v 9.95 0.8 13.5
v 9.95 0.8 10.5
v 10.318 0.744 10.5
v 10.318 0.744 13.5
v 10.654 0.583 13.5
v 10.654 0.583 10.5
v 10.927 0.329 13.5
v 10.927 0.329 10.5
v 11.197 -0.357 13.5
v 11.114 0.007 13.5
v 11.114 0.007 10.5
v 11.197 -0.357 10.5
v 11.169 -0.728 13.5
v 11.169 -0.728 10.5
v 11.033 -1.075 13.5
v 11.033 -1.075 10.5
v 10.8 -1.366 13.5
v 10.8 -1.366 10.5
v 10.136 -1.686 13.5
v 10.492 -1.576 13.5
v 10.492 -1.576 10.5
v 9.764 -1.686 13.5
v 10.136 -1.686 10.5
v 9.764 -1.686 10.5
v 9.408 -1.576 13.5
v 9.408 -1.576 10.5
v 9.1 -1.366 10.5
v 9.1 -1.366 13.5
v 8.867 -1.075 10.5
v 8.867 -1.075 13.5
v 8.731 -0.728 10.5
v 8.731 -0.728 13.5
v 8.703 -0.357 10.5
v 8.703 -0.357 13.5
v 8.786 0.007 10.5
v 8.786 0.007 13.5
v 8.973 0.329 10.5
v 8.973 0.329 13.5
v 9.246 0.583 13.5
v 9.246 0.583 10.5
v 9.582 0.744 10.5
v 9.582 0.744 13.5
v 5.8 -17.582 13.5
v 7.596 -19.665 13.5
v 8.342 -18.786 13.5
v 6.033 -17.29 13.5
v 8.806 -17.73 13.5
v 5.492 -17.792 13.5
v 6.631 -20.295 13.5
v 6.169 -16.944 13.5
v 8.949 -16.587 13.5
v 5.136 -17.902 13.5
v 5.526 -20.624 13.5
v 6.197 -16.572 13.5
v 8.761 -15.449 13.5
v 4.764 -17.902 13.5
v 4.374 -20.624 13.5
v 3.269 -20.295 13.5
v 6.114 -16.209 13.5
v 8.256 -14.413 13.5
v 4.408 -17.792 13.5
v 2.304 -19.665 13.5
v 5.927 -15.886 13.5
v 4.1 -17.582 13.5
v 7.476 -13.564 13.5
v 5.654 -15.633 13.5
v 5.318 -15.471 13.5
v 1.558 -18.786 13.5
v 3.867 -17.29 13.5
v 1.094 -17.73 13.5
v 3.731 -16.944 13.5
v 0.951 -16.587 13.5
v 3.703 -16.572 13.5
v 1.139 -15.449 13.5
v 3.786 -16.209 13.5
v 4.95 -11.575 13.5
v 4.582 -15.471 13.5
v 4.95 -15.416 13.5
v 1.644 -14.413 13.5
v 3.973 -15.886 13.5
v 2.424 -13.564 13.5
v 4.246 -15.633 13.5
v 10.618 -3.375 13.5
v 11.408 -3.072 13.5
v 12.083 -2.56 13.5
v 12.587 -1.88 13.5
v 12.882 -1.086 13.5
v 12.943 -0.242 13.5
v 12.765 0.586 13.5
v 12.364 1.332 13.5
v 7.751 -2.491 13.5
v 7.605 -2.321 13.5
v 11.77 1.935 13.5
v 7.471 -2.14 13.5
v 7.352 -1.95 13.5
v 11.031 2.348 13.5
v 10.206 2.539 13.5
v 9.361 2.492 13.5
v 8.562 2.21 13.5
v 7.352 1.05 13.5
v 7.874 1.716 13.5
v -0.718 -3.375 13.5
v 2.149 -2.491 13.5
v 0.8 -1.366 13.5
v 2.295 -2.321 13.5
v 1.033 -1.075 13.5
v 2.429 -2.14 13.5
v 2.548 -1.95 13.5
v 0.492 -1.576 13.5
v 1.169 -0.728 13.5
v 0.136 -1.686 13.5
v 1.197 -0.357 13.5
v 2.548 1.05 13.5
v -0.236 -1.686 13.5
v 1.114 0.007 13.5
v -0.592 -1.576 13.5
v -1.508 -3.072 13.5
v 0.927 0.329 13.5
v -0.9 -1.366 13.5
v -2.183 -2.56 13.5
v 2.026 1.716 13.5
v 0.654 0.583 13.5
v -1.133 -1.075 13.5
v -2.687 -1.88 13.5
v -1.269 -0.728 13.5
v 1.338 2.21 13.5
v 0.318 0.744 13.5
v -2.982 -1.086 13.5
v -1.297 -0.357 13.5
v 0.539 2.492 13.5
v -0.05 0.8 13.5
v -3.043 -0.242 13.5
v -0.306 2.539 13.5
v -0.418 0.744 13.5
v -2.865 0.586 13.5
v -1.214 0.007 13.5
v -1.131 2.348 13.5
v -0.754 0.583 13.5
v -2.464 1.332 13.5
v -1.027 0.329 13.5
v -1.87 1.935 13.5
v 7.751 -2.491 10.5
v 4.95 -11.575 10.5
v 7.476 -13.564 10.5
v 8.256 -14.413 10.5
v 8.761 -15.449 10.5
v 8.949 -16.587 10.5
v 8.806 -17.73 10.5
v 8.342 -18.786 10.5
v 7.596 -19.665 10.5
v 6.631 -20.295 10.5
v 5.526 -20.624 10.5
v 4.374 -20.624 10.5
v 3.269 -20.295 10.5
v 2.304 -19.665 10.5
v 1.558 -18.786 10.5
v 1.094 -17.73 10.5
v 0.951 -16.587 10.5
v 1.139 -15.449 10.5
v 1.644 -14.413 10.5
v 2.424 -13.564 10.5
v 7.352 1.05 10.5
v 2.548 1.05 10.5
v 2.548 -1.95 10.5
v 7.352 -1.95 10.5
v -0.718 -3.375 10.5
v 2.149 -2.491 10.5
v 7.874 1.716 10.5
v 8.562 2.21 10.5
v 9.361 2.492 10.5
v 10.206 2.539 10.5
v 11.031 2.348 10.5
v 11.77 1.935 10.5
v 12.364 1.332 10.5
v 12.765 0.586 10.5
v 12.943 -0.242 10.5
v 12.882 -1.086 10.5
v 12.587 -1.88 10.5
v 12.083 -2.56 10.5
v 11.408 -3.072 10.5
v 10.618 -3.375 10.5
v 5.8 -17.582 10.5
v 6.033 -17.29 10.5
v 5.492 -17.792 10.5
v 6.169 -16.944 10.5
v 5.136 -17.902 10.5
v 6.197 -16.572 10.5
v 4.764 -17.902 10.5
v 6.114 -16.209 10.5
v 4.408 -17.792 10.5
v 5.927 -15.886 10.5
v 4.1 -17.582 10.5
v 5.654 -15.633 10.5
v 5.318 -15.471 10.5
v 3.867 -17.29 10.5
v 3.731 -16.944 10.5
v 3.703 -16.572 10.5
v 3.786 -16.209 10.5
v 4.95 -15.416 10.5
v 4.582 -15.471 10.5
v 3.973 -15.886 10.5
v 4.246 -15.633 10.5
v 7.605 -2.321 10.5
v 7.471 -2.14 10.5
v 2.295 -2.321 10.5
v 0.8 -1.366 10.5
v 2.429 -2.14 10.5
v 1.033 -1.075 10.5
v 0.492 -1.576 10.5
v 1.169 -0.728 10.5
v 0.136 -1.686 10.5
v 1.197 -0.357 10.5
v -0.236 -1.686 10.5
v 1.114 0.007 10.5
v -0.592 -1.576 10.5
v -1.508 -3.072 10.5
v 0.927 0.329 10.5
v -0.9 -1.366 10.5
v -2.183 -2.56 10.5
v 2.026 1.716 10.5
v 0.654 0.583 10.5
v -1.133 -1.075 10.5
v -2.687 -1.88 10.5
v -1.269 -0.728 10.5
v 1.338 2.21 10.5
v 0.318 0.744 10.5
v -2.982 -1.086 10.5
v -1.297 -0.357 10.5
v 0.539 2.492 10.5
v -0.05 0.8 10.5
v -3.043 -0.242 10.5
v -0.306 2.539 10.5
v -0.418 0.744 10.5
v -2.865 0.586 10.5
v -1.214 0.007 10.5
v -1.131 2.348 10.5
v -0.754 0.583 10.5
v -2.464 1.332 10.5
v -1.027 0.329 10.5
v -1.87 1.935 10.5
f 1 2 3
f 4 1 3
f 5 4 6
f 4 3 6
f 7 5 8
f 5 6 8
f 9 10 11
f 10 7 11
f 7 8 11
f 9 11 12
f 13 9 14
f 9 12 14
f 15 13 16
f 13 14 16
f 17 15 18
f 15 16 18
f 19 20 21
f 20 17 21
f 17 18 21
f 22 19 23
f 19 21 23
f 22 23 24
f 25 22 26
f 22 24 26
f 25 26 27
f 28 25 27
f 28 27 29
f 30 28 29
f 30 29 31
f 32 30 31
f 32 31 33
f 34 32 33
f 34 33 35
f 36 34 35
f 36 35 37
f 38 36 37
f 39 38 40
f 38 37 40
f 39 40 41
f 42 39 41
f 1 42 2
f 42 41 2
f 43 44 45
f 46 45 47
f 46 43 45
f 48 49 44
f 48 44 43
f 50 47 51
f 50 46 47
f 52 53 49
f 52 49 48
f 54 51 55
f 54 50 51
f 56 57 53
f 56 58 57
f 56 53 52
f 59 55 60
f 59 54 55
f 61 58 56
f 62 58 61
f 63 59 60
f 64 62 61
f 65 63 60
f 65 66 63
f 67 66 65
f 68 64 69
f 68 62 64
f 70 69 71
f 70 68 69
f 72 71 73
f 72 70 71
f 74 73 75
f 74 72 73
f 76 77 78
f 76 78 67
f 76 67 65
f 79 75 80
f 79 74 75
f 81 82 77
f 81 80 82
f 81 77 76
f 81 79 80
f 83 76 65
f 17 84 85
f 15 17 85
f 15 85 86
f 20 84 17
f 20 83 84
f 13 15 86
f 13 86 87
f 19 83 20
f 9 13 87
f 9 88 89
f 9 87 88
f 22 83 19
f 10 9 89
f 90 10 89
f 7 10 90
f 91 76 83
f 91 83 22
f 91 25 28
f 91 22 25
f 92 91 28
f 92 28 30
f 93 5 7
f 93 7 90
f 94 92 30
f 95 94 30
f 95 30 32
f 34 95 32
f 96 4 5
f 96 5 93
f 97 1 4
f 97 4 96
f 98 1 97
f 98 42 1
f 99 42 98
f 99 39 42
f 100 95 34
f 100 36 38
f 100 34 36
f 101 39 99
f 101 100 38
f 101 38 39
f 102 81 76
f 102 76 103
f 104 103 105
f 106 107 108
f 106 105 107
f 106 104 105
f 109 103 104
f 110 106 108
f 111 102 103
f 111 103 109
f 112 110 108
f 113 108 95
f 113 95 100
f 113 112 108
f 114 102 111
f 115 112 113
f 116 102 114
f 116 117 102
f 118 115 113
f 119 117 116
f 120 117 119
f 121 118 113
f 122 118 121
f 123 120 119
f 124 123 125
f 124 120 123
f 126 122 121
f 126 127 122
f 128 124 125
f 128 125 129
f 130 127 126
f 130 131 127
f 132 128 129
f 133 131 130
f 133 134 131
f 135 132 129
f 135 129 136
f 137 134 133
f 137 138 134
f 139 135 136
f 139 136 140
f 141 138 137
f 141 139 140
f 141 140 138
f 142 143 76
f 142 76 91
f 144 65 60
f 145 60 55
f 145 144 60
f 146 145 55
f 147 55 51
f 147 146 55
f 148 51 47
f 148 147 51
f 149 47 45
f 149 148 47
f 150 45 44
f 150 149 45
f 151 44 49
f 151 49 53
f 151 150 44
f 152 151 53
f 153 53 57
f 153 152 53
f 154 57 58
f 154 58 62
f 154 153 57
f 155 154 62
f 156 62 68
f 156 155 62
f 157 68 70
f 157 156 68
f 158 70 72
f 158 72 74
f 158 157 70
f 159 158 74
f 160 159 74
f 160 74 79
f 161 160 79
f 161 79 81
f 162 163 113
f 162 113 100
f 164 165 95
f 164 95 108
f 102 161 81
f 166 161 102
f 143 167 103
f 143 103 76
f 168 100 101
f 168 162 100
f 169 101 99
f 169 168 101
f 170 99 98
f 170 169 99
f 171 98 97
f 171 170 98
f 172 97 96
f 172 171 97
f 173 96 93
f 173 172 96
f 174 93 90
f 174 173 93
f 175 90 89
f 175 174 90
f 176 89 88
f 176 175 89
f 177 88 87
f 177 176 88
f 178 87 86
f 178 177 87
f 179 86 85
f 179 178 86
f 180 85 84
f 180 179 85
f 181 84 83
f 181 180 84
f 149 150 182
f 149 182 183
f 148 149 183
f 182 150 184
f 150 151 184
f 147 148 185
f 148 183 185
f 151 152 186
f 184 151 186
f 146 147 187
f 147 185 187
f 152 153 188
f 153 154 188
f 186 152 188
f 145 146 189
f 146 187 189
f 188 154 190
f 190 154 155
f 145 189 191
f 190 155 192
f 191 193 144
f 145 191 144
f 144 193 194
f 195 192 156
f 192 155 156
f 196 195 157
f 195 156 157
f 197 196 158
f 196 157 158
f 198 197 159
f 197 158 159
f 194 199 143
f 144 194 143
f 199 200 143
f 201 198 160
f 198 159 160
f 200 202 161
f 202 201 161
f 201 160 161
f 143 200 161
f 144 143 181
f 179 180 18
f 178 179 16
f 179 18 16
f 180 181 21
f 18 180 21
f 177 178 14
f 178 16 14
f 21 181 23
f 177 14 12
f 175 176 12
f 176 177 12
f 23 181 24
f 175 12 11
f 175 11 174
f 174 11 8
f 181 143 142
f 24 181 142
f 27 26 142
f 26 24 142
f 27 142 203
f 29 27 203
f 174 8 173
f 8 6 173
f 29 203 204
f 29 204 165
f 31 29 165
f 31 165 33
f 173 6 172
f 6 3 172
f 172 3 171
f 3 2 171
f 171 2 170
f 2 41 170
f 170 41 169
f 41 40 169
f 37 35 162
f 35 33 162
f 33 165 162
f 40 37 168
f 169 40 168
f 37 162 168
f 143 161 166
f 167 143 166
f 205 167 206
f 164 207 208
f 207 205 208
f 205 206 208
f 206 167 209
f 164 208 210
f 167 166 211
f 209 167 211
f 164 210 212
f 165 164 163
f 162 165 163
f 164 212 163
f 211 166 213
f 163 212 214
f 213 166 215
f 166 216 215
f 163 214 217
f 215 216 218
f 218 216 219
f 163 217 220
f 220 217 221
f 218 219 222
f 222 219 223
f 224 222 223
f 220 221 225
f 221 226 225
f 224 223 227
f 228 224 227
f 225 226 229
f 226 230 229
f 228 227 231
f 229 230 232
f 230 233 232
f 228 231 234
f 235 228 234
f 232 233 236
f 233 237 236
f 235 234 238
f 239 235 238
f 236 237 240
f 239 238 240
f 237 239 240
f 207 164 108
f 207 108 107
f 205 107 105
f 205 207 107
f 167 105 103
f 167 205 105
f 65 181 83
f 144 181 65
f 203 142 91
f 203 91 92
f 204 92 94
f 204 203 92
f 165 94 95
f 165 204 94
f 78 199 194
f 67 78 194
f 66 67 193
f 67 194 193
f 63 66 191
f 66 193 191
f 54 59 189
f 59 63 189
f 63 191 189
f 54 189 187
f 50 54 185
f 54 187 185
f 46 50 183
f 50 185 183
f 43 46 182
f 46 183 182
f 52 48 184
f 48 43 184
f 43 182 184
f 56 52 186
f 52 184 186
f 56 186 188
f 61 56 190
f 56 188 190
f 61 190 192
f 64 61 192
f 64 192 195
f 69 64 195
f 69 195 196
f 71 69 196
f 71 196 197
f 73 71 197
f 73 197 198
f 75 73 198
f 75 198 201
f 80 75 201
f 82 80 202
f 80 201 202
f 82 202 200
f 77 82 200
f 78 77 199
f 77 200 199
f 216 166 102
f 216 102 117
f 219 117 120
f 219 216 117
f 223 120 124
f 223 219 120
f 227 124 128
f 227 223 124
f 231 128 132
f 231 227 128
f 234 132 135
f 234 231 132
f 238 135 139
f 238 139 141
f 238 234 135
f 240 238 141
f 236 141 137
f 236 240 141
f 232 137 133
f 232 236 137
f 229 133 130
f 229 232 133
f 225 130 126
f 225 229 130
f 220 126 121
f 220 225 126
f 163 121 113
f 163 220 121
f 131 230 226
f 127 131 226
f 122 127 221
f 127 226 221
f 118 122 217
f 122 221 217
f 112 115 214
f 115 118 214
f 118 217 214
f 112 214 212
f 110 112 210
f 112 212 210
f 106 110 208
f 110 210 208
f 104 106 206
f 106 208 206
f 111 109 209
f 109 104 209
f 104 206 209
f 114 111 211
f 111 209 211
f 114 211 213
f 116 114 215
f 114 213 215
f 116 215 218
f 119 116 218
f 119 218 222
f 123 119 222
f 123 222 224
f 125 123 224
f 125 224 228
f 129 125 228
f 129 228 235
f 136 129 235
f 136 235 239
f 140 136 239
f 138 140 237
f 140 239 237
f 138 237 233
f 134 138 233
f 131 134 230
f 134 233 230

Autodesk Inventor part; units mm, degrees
ref_plane "YZ Plane" through (0, 0, 0) normal (1, 0, 0) x (0, 1, 0)
ref_plane "XZ Plane" through (0, 0, 0) normal (0, 1, 0) x (-1, 0, 0)
ref_plane "作業平面1" through (14.45, -5.25, 10.5) normal (0, 0, 1) x (0, 1, 0)
sketch "スケッチ1" plane through (14.45, -5.25, 10.5) normal (0, 0, 1) x (0, 1, 0)
  circle A0 centre (4.8, 4.5) radius 1.25
  circle A1 centre (4.8, 14.5) radius 1.25
  circle A2 centre (4.5, 225.5) radius 1.5 projected
  circle A3 centre (4.5, 201.5) radius 1.5 projected
  line L0 (9, 0) -> (0, 0) projected
  line L1 (9, 0) -> (9, 230) projected
  line L2 (0, 230) -> (9, 230) projected
  line L3 (0, 0) -> (0, 230) projected
  circle A4 centre (-11.4155, 9.5) radius 1.25
  circle A5 centre (4.8, 14.5) radius 4.6
  circle A6 centre (4.8, 4.5) radius 4.6
  circle A7 centre (-11.4155, 9.5) radius 4.25
  line L4 (9.4, 19.1) -> (-15.6655, 19.1)
  line L5 (-15.6655, 19.1) -> (-15.6655, -0.1)
  line L6 (-15.6655, -0.1) -> (9.4, -0.1)
  line L7 (9.4, -0.1) -> (9.4, 19.1)
  point P0 (5.25, 14.45)
  dimension "d0" = 2.5
  dimension "d1" = 9.2
  dimension "d2" = 9.2
  dimension "d3" = 8.5
  dimension "d14" = 2.5
extrude "押し出し1" add sketch "スケッチ1" along normal blind 3 contours L1 A6 L7 L6 L0 | L0 A6 L1 | A6 L0 | L0 A6 L1 | L1 A6 | A7 | A6 L6 L5 L4 L3 L0 | L0 L3 L4 A5 L1 A6 | L1 A5 L7 A6 | A5 L1 | L1 A5 | A5 L1 L4 L7 | A5 L4 L1
sketch "スケッチ2" plane through (14.45, -5.25, 10.5) normal (0, 0, -1) x (-1, 0, 0)
  circle A0 centre (4.5, 4.8) radius 1.25 projected
  circle A1 centre (14.5, 4.8) radius 1.25 projected
  circle A2 centre (9.5, -11.4155) radius 1.25 projected
  line L0 (-0.1, -15.6655) -> (-0.1, 9.4) projected
  line L1 (-0.1, 9.4) -> (19.1, 9.4) projected
  line L2 (19.1, 9.4) -> (19.1, -15.6655) projected
  line L3 (19.1, -15.6655) -> (-0.1, -15.6655) projected
  circle A3 centre (4.5, 4.8) radius 3
  circle A4 centre (14.5, 4.8) radius 3
  circle A5 centre (9.5, -11.4155) radius 4
  line L4 (4.5, 4.8) -> (9.5, -11.4155) construction
  line L5 (3.0666, 4.358) -> (8.0666, -11.8575)
  line L6 (10.9334, -10.9735) -> (5.9334, 5.242)
  arc A6 (5.9334, 5.242) -> (3.0666, 4.358) centre (4.5, 4.8) ccw
  arc A7 (8.0666, -11.8575) -> (10.9334, -10.9735) centre (9.5, -11.4155) ccw
  line L7 (9.5, -11.4155) -> (14.5, 4.8) construction
  line L8 (10.9334, -11.8575) -> (15.9334, 4.358)
  line L9 (13.0666, 5.242) -> (8.0666, -10.9735)
  arc A8 (8.0666, -10.9735) -> (10.9334, -11.8575) centre (9.5, -11.4155) ccw
  arc A9 (15.9334, 4.358) -> (13.0666, 5.242) centre (14.5, 4.8) ccw
  line L10 (4.5, 4.8) -> (14.5, 4.8) construction
  line L11 (4.5, 3.3) -> (14.5, 3.3)
  line L12 (14.5, 6.3) -> (4.5, 6.3)
  arc A10 (4.5, 6.3) -> (4.5, 3.3) centre (4.5, 4.8) ccw
  arc A11 (14.5, 3.3) -> (14.5, 6.3) centre (14.5, 4.8) ccw
  point P0 (14.45, 5.25)
  point P1 (7, -3.3077)
  point P2 (12, -3.3077)
  point P3 (9.5, 4.8)
  dimension "d6" = 6
  dimension "d7" = 6
  dimension "d8" = 8
  dimension "d9" = 3
  dimension "d10" = 3
  dimension "d11" = 3
extrude "押し出し2" cut sketch "スケッチ2" against normal blind 10 contours A0 | A1 | A2 | A3 L11 L6 A6 L12 | A3 L12 A4 L11 | L12 A6 L5 A3 | A3 L6 L11 | L5 A10 L11 L6 A3 | A3 L6 L9 A5 L5 | L12 A9 L9 L11 A4 | A4 L8 A9 L12 | A6 L6 L11 A10 | L11 L9 A4 | L5 A7 L8 A5 | A5 L9 A8 L5 | A9 A11 L11 L9 | L9 A4 L8 A5 L6 | L6 A5 L9 | L9 L11 A11 L8 A4 | A5 L6 A7 A8 L9 | A5 L8 A7 L6 keep common part
properties part number "従動節固定"
